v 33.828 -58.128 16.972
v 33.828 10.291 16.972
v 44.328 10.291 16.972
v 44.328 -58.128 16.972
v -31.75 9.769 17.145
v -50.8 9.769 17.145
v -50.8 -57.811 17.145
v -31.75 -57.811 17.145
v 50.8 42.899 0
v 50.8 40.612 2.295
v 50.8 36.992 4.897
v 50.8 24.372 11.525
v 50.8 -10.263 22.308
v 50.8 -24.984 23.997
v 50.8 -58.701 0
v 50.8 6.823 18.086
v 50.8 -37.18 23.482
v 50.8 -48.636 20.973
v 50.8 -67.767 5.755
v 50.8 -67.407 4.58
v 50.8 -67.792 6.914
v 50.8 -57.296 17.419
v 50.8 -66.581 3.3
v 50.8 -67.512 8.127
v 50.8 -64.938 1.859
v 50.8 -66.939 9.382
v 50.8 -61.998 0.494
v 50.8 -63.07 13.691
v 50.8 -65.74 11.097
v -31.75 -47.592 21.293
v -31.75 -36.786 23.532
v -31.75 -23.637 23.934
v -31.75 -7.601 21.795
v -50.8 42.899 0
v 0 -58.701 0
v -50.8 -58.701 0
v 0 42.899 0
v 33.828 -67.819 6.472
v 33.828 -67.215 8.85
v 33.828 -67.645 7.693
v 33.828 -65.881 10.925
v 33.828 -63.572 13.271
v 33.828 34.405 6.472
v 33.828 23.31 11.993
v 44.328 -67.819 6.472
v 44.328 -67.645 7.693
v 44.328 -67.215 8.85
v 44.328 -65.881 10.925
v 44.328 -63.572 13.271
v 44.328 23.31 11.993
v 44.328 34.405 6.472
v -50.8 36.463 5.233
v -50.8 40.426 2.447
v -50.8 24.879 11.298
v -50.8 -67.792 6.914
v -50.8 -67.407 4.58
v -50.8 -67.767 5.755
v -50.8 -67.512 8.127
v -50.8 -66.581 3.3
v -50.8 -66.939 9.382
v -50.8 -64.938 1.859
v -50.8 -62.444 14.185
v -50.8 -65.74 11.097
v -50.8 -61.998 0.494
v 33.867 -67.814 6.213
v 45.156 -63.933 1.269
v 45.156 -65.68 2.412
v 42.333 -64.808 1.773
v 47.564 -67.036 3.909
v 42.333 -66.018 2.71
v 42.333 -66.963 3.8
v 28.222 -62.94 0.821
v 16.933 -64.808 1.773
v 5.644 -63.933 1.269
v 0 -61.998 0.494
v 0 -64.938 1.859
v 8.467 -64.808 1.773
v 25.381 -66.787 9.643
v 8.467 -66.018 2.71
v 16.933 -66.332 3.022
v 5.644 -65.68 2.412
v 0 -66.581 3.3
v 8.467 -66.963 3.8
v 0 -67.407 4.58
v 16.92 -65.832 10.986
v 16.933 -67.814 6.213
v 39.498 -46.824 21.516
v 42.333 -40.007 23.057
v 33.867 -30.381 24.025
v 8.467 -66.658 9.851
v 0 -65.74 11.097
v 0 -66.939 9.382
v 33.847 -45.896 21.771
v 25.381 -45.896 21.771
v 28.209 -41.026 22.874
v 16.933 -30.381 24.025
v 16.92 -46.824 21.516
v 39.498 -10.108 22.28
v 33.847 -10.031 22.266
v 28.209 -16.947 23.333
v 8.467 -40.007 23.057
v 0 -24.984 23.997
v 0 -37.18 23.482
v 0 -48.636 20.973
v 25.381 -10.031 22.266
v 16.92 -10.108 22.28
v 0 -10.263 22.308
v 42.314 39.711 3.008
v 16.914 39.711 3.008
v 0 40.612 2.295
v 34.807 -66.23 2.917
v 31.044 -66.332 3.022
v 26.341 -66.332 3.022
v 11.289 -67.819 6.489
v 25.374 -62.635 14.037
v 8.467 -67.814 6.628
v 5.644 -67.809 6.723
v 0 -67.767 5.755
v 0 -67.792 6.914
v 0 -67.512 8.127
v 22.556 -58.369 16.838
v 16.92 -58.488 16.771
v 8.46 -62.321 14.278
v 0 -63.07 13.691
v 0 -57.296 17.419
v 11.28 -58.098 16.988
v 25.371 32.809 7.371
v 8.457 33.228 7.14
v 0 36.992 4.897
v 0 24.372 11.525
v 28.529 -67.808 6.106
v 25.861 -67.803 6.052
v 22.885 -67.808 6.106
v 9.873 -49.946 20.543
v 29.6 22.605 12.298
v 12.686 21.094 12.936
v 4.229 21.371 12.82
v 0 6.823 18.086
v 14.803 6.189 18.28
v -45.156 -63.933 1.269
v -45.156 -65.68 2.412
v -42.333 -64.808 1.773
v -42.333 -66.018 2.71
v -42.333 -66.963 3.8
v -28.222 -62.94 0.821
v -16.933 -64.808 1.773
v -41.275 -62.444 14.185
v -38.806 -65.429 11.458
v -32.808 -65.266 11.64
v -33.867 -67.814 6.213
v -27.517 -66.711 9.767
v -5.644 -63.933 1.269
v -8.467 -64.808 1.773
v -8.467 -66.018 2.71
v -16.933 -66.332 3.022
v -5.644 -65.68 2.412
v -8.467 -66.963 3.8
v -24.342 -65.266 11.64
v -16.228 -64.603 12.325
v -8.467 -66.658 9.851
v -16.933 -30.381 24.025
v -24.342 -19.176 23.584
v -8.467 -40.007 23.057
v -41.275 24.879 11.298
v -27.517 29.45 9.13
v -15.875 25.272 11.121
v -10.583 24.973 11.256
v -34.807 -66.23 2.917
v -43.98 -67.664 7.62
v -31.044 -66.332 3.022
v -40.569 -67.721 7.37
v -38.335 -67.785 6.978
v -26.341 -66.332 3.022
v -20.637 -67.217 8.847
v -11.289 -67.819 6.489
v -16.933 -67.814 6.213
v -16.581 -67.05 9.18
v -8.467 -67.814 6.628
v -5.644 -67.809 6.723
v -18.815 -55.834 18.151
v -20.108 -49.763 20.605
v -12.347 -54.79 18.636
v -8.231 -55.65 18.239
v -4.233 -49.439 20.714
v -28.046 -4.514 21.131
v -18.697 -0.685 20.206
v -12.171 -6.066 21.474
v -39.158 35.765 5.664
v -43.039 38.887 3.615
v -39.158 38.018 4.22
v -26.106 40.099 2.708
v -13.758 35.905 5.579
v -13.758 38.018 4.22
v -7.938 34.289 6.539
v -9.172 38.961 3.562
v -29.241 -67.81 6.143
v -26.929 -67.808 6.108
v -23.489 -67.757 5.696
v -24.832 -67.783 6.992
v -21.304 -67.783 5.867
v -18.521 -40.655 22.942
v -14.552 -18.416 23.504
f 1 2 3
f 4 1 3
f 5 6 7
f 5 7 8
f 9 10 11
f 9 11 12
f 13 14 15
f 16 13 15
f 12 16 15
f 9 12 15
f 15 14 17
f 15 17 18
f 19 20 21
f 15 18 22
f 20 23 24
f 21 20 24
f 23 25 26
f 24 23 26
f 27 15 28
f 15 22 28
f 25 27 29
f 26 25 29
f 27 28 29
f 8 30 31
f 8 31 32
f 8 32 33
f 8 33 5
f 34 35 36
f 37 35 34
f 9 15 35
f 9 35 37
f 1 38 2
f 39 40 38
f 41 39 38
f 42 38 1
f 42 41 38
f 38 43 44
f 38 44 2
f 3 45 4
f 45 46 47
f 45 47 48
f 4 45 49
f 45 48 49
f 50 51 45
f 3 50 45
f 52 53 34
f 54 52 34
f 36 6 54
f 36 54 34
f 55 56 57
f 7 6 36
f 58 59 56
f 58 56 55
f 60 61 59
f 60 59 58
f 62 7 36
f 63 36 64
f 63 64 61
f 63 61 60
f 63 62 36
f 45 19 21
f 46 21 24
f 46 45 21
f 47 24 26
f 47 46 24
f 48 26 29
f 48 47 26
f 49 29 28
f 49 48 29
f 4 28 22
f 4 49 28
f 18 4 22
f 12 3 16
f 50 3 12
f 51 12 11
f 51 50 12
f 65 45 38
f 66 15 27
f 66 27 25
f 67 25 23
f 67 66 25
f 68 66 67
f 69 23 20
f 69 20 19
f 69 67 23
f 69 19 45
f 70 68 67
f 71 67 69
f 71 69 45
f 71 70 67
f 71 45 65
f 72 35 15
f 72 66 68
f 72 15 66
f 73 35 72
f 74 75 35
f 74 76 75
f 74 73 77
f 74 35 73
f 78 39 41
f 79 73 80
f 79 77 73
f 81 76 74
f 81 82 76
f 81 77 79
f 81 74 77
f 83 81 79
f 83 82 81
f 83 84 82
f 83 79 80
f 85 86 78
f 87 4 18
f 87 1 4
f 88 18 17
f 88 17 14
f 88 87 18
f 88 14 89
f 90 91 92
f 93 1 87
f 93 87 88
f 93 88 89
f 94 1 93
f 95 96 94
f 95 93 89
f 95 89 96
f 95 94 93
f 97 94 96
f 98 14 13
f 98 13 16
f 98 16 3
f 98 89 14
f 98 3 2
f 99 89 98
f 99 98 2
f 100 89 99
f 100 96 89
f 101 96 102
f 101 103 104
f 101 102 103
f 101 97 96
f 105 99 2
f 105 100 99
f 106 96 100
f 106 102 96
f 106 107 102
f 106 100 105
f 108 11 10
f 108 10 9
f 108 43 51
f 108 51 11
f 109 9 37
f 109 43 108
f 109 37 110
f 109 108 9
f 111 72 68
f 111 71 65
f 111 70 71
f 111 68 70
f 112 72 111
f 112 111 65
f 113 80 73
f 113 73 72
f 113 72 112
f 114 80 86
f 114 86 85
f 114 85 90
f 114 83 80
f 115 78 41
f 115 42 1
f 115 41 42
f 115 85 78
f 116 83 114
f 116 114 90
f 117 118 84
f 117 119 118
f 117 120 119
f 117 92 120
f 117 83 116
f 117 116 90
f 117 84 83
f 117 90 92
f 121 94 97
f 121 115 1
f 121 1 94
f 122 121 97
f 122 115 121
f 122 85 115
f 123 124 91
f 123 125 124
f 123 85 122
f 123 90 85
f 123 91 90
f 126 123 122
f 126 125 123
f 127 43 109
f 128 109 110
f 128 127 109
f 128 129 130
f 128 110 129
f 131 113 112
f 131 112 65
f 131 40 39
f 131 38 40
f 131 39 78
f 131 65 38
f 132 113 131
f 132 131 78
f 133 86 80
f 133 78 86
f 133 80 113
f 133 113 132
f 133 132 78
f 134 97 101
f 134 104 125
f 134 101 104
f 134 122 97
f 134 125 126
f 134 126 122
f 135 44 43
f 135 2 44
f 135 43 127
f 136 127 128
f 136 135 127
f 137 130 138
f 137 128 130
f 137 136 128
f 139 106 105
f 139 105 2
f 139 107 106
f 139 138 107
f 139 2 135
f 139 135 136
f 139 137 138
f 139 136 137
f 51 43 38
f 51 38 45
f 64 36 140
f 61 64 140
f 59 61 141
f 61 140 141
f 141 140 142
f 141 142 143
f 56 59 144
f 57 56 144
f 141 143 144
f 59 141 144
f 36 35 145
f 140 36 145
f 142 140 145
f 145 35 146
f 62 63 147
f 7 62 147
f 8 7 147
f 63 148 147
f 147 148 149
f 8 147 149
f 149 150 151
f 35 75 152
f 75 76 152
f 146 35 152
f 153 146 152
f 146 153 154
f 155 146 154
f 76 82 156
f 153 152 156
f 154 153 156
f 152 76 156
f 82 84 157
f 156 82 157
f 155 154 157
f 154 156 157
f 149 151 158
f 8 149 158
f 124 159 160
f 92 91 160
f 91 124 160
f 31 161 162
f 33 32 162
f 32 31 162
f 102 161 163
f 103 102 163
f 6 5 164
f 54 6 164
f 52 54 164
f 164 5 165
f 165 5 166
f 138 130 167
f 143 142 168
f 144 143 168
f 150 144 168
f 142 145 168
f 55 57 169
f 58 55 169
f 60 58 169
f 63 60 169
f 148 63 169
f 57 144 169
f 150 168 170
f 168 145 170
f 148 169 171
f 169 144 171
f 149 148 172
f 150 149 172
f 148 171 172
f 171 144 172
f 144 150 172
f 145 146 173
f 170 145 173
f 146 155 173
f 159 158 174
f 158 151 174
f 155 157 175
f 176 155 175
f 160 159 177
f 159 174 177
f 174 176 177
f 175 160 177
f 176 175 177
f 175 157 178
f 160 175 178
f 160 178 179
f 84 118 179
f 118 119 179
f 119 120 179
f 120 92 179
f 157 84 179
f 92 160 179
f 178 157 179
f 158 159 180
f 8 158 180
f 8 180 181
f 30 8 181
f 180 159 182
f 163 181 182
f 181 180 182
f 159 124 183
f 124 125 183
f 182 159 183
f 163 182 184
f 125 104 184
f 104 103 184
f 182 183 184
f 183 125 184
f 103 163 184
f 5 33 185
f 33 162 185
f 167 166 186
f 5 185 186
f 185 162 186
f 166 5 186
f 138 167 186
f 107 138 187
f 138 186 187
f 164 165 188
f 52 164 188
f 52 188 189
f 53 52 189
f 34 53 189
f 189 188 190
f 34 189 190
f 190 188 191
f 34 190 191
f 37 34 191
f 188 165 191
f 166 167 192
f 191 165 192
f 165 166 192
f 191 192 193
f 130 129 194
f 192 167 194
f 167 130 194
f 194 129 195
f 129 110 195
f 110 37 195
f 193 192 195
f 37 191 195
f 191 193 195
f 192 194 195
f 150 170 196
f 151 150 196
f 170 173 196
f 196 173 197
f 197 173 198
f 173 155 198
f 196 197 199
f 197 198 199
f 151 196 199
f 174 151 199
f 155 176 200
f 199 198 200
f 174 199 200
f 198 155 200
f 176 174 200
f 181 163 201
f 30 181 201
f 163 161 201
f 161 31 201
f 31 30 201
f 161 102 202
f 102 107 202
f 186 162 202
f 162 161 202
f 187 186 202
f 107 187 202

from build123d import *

# Parameters (mm, degrees)
F1_DEPTH = 50.8
F2_W     = 10.5
F2_H     = 10.5
F3_DEPTH = 292.1
F5_W     = 19.05
F5_H     = 101.6
F6_DEPTH = 8.255


with BuildPart() as f1:
    # F0 (on Right) → F1 (new body, symmetric)
    with BuildSketch(Plane.YZ):
        with BuildLine():
            add(Edge.make_bspline(
                [(-58.7011294477, 0), (-63.0088709792, 0), (-76.6224606235, 7.8114364795), (-29.3166396484, 37.358778601), (36.9753469676, 7.968135282), (42.8988705523, 0)],
                knots=[0, 0, 0, 0, 0.1791157224, 0.5263720297, 1, 1, 1, 1], degree=3))
            Line((-58.7011294477, 0), (42.8988705523, 0))
        make_face()
    extrude(amount=F1_DEPTH, both=True)

    # F2 (on Front) → F3 (cut, symmetric)
    with BuildSketch(Plane.XZ):
        with Locations((39.0781049237, 11.7218950763)):
            Rectangle(F2_W, F2_H)
    extrude(amount=F3_DEPTH, both=True, mode=Mode.SUBTRACT)

    # F5 (on offset) → F6 (cut)
    with BuildSketch(Plane.XY.offset(25.4)):
        with Locations((-41.275, -7.9011294477)):
            Rectangle(F5_W, F5_H)
    extrude(amount=-F6_DEPTH, mode=Mode.SUBTRACT)


solid = f1.part
